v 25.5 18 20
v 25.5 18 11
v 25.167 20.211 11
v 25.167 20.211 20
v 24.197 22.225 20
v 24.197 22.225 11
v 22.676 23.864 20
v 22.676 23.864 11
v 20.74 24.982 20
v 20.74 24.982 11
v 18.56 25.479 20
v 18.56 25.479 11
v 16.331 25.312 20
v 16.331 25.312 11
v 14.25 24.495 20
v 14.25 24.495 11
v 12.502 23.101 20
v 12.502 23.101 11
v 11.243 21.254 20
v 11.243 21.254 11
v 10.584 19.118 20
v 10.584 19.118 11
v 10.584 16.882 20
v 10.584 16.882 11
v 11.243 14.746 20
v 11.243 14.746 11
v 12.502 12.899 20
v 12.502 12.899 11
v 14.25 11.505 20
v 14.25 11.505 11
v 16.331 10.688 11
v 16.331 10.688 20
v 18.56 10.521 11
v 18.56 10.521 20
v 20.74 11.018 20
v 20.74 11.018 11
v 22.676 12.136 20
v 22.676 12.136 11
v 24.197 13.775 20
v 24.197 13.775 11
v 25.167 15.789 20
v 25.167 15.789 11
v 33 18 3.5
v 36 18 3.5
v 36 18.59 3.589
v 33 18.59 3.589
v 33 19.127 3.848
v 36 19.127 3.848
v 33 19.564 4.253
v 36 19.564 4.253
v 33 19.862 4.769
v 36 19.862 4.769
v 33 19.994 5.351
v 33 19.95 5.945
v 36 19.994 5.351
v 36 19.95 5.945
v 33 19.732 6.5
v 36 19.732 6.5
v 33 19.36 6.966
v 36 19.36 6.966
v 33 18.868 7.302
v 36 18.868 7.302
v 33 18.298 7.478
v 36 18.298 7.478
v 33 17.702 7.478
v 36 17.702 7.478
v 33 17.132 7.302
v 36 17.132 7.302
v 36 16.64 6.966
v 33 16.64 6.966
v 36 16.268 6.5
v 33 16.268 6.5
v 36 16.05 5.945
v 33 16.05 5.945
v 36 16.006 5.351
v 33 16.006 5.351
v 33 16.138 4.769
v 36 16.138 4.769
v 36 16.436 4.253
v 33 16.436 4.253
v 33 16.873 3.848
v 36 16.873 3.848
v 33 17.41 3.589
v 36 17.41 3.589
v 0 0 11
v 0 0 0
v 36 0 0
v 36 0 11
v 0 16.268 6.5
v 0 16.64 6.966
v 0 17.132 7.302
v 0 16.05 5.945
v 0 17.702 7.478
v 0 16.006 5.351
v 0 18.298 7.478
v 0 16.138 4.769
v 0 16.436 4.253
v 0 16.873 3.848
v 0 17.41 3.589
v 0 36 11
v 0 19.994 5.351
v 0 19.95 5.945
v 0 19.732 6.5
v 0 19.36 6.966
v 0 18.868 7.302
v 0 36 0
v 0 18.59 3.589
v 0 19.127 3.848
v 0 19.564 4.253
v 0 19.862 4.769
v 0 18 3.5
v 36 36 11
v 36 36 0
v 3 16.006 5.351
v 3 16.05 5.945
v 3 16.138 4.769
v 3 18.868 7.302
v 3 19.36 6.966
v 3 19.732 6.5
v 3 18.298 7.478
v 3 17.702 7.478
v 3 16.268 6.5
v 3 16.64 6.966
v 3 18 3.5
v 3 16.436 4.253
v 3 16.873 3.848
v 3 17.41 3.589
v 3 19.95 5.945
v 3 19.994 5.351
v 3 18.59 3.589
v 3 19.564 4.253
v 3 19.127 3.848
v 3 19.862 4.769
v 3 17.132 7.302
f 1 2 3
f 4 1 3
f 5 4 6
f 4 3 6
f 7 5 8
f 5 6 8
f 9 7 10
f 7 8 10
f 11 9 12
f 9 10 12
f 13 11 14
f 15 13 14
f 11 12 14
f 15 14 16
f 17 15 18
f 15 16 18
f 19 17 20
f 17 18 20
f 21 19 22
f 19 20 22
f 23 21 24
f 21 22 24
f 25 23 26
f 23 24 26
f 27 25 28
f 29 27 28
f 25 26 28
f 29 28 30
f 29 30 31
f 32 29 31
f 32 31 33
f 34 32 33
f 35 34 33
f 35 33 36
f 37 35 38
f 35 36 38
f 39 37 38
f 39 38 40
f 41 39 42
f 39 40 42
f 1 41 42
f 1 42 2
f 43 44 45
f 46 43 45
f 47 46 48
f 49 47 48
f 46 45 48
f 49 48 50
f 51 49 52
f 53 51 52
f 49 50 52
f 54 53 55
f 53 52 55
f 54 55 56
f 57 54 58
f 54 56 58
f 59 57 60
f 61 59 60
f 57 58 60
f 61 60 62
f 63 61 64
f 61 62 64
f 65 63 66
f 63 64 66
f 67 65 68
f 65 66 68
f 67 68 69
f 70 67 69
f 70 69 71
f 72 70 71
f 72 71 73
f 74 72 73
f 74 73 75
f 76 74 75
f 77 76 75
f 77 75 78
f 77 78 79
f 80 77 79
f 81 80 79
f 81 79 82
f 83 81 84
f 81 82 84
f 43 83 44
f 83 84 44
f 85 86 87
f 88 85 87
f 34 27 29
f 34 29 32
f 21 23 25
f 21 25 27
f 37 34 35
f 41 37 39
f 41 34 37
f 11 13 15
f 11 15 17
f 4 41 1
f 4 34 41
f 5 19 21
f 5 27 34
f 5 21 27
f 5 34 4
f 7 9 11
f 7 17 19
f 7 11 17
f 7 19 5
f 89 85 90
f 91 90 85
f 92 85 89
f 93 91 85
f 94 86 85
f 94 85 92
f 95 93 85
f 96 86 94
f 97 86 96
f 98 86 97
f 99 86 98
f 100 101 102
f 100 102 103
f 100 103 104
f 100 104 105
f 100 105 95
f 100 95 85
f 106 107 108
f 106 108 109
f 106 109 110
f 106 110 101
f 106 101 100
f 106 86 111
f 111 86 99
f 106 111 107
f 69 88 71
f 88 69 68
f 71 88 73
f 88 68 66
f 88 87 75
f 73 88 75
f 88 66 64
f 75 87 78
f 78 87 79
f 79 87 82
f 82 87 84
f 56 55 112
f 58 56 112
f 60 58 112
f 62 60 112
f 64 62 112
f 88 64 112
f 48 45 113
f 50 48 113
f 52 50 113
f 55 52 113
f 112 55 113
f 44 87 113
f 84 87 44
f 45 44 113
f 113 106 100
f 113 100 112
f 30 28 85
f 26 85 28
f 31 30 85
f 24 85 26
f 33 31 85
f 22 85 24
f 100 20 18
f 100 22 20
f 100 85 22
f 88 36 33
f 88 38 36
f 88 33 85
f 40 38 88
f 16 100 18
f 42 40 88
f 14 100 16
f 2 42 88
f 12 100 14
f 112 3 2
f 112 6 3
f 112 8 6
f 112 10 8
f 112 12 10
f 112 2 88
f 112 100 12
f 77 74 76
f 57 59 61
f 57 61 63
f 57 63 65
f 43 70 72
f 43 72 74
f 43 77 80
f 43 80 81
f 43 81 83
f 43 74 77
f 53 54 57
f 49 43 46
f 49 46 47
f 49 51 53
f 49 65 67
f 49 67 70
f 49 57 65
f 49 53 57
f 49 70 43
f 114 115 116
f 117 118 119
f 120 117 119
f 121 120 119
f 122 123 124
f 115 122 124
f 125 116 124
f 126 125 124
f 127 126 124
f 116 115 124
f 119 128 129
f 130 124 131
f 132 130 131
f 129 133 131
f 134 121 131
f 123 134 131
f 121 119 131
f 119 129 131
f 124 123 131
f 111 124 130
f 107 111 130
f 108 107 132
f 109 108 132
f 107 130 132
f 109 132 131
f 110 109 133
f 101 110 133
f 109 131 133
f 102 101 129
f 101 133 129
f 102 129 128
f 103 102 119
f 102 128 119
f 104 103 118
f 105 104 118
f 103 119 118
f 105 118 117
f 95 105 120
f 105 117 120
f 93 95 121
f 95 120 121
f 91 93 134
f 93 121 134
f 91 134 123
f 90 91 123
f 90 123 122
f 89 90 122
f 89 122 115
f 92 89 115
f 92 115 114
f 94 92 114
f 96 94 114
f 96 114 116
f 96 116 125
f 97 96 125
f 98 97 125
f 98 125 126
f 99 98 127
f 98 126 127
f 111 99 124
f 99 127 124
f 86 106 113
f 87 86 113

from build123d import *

# Parameters (mm, degrees)
SKETCH_1_W          = 36
SKETCH_1_H          = 36
SKETCH_1_R          = 7.5
EXTRUDE_1_DEPTH     = 11
EXTRUDE_START       = 11
SKETCH_1_3_R        = 7.5
EXTRUDE_2_DEPTH     = 9
SKETCH_2_R          = 2
CUT_EXTRUDE_1_DEPTH = 3
CUT_EXTRUDE_START   = -33
SKETCH_2_2_R        = 2
CUT_EXTRUDE_2_DEPTH = 3


with BuildPart() as part:
    # 草图1 → 凸台-拉伸1 (new body)
    # profile 1 of 2: a face of its own
    with BuildSketch(Plane.XY):
        with Locations((18, 18)):
            Rectangle(SKETCH_1_W, SKETCH_1_H)
        with Locations((18, 18)):
            Circle(SKETCH_1_R, mode=Mode.SUBTRACT)
    # profile 2 of 2: a face of its own
    with BuildSketch(Plane.XY):
        with Locations((18, 18)):
            Circle(SKETCH_1_R)
    extrude(amount=EXTRUDE_1_DEPTH)

    # 草图1<3> → 凸台-拉伸2 (add)
    with BuildSketch(Plane.XY.offset(EXTRUDE_START)):
        with Locations((18, 18)):
            Circle(SKETCH_1_3_R)
    extrude(amount=EXTRUDE_2_DEPTH)

    # 草图2 → 切除-拉伸1 (cut)
    with BuildSketch(Plane(origin=(36, 0, 0), x_dir=(0, 0, -1), z_dir=(1, 0, 0))):
        with Locations((-5.5, 18)):
            Circle(SKETCH_2_R)
    extrude(amount=-CUT_EXTRUDE_1_DEPTH, mode=Mode.SUBTRACT)

    # 草图2<2> → 切除-拉伸2 (cut)
    with BuildSketch(Plane(origin=(36, 0, 0), x_dir=(0, 0, -1), z_dir=(1, 0, 0)).offset(CUT_EXTRUDE_START)):
        with Locations((-5.5, 18)):
            Circle(SKETCH_2_2_R)
    extrude(amount=-CUT_EXTRUDE_2_DEPTH, mode=Mode.SUBTRACT)


solid = part.part
